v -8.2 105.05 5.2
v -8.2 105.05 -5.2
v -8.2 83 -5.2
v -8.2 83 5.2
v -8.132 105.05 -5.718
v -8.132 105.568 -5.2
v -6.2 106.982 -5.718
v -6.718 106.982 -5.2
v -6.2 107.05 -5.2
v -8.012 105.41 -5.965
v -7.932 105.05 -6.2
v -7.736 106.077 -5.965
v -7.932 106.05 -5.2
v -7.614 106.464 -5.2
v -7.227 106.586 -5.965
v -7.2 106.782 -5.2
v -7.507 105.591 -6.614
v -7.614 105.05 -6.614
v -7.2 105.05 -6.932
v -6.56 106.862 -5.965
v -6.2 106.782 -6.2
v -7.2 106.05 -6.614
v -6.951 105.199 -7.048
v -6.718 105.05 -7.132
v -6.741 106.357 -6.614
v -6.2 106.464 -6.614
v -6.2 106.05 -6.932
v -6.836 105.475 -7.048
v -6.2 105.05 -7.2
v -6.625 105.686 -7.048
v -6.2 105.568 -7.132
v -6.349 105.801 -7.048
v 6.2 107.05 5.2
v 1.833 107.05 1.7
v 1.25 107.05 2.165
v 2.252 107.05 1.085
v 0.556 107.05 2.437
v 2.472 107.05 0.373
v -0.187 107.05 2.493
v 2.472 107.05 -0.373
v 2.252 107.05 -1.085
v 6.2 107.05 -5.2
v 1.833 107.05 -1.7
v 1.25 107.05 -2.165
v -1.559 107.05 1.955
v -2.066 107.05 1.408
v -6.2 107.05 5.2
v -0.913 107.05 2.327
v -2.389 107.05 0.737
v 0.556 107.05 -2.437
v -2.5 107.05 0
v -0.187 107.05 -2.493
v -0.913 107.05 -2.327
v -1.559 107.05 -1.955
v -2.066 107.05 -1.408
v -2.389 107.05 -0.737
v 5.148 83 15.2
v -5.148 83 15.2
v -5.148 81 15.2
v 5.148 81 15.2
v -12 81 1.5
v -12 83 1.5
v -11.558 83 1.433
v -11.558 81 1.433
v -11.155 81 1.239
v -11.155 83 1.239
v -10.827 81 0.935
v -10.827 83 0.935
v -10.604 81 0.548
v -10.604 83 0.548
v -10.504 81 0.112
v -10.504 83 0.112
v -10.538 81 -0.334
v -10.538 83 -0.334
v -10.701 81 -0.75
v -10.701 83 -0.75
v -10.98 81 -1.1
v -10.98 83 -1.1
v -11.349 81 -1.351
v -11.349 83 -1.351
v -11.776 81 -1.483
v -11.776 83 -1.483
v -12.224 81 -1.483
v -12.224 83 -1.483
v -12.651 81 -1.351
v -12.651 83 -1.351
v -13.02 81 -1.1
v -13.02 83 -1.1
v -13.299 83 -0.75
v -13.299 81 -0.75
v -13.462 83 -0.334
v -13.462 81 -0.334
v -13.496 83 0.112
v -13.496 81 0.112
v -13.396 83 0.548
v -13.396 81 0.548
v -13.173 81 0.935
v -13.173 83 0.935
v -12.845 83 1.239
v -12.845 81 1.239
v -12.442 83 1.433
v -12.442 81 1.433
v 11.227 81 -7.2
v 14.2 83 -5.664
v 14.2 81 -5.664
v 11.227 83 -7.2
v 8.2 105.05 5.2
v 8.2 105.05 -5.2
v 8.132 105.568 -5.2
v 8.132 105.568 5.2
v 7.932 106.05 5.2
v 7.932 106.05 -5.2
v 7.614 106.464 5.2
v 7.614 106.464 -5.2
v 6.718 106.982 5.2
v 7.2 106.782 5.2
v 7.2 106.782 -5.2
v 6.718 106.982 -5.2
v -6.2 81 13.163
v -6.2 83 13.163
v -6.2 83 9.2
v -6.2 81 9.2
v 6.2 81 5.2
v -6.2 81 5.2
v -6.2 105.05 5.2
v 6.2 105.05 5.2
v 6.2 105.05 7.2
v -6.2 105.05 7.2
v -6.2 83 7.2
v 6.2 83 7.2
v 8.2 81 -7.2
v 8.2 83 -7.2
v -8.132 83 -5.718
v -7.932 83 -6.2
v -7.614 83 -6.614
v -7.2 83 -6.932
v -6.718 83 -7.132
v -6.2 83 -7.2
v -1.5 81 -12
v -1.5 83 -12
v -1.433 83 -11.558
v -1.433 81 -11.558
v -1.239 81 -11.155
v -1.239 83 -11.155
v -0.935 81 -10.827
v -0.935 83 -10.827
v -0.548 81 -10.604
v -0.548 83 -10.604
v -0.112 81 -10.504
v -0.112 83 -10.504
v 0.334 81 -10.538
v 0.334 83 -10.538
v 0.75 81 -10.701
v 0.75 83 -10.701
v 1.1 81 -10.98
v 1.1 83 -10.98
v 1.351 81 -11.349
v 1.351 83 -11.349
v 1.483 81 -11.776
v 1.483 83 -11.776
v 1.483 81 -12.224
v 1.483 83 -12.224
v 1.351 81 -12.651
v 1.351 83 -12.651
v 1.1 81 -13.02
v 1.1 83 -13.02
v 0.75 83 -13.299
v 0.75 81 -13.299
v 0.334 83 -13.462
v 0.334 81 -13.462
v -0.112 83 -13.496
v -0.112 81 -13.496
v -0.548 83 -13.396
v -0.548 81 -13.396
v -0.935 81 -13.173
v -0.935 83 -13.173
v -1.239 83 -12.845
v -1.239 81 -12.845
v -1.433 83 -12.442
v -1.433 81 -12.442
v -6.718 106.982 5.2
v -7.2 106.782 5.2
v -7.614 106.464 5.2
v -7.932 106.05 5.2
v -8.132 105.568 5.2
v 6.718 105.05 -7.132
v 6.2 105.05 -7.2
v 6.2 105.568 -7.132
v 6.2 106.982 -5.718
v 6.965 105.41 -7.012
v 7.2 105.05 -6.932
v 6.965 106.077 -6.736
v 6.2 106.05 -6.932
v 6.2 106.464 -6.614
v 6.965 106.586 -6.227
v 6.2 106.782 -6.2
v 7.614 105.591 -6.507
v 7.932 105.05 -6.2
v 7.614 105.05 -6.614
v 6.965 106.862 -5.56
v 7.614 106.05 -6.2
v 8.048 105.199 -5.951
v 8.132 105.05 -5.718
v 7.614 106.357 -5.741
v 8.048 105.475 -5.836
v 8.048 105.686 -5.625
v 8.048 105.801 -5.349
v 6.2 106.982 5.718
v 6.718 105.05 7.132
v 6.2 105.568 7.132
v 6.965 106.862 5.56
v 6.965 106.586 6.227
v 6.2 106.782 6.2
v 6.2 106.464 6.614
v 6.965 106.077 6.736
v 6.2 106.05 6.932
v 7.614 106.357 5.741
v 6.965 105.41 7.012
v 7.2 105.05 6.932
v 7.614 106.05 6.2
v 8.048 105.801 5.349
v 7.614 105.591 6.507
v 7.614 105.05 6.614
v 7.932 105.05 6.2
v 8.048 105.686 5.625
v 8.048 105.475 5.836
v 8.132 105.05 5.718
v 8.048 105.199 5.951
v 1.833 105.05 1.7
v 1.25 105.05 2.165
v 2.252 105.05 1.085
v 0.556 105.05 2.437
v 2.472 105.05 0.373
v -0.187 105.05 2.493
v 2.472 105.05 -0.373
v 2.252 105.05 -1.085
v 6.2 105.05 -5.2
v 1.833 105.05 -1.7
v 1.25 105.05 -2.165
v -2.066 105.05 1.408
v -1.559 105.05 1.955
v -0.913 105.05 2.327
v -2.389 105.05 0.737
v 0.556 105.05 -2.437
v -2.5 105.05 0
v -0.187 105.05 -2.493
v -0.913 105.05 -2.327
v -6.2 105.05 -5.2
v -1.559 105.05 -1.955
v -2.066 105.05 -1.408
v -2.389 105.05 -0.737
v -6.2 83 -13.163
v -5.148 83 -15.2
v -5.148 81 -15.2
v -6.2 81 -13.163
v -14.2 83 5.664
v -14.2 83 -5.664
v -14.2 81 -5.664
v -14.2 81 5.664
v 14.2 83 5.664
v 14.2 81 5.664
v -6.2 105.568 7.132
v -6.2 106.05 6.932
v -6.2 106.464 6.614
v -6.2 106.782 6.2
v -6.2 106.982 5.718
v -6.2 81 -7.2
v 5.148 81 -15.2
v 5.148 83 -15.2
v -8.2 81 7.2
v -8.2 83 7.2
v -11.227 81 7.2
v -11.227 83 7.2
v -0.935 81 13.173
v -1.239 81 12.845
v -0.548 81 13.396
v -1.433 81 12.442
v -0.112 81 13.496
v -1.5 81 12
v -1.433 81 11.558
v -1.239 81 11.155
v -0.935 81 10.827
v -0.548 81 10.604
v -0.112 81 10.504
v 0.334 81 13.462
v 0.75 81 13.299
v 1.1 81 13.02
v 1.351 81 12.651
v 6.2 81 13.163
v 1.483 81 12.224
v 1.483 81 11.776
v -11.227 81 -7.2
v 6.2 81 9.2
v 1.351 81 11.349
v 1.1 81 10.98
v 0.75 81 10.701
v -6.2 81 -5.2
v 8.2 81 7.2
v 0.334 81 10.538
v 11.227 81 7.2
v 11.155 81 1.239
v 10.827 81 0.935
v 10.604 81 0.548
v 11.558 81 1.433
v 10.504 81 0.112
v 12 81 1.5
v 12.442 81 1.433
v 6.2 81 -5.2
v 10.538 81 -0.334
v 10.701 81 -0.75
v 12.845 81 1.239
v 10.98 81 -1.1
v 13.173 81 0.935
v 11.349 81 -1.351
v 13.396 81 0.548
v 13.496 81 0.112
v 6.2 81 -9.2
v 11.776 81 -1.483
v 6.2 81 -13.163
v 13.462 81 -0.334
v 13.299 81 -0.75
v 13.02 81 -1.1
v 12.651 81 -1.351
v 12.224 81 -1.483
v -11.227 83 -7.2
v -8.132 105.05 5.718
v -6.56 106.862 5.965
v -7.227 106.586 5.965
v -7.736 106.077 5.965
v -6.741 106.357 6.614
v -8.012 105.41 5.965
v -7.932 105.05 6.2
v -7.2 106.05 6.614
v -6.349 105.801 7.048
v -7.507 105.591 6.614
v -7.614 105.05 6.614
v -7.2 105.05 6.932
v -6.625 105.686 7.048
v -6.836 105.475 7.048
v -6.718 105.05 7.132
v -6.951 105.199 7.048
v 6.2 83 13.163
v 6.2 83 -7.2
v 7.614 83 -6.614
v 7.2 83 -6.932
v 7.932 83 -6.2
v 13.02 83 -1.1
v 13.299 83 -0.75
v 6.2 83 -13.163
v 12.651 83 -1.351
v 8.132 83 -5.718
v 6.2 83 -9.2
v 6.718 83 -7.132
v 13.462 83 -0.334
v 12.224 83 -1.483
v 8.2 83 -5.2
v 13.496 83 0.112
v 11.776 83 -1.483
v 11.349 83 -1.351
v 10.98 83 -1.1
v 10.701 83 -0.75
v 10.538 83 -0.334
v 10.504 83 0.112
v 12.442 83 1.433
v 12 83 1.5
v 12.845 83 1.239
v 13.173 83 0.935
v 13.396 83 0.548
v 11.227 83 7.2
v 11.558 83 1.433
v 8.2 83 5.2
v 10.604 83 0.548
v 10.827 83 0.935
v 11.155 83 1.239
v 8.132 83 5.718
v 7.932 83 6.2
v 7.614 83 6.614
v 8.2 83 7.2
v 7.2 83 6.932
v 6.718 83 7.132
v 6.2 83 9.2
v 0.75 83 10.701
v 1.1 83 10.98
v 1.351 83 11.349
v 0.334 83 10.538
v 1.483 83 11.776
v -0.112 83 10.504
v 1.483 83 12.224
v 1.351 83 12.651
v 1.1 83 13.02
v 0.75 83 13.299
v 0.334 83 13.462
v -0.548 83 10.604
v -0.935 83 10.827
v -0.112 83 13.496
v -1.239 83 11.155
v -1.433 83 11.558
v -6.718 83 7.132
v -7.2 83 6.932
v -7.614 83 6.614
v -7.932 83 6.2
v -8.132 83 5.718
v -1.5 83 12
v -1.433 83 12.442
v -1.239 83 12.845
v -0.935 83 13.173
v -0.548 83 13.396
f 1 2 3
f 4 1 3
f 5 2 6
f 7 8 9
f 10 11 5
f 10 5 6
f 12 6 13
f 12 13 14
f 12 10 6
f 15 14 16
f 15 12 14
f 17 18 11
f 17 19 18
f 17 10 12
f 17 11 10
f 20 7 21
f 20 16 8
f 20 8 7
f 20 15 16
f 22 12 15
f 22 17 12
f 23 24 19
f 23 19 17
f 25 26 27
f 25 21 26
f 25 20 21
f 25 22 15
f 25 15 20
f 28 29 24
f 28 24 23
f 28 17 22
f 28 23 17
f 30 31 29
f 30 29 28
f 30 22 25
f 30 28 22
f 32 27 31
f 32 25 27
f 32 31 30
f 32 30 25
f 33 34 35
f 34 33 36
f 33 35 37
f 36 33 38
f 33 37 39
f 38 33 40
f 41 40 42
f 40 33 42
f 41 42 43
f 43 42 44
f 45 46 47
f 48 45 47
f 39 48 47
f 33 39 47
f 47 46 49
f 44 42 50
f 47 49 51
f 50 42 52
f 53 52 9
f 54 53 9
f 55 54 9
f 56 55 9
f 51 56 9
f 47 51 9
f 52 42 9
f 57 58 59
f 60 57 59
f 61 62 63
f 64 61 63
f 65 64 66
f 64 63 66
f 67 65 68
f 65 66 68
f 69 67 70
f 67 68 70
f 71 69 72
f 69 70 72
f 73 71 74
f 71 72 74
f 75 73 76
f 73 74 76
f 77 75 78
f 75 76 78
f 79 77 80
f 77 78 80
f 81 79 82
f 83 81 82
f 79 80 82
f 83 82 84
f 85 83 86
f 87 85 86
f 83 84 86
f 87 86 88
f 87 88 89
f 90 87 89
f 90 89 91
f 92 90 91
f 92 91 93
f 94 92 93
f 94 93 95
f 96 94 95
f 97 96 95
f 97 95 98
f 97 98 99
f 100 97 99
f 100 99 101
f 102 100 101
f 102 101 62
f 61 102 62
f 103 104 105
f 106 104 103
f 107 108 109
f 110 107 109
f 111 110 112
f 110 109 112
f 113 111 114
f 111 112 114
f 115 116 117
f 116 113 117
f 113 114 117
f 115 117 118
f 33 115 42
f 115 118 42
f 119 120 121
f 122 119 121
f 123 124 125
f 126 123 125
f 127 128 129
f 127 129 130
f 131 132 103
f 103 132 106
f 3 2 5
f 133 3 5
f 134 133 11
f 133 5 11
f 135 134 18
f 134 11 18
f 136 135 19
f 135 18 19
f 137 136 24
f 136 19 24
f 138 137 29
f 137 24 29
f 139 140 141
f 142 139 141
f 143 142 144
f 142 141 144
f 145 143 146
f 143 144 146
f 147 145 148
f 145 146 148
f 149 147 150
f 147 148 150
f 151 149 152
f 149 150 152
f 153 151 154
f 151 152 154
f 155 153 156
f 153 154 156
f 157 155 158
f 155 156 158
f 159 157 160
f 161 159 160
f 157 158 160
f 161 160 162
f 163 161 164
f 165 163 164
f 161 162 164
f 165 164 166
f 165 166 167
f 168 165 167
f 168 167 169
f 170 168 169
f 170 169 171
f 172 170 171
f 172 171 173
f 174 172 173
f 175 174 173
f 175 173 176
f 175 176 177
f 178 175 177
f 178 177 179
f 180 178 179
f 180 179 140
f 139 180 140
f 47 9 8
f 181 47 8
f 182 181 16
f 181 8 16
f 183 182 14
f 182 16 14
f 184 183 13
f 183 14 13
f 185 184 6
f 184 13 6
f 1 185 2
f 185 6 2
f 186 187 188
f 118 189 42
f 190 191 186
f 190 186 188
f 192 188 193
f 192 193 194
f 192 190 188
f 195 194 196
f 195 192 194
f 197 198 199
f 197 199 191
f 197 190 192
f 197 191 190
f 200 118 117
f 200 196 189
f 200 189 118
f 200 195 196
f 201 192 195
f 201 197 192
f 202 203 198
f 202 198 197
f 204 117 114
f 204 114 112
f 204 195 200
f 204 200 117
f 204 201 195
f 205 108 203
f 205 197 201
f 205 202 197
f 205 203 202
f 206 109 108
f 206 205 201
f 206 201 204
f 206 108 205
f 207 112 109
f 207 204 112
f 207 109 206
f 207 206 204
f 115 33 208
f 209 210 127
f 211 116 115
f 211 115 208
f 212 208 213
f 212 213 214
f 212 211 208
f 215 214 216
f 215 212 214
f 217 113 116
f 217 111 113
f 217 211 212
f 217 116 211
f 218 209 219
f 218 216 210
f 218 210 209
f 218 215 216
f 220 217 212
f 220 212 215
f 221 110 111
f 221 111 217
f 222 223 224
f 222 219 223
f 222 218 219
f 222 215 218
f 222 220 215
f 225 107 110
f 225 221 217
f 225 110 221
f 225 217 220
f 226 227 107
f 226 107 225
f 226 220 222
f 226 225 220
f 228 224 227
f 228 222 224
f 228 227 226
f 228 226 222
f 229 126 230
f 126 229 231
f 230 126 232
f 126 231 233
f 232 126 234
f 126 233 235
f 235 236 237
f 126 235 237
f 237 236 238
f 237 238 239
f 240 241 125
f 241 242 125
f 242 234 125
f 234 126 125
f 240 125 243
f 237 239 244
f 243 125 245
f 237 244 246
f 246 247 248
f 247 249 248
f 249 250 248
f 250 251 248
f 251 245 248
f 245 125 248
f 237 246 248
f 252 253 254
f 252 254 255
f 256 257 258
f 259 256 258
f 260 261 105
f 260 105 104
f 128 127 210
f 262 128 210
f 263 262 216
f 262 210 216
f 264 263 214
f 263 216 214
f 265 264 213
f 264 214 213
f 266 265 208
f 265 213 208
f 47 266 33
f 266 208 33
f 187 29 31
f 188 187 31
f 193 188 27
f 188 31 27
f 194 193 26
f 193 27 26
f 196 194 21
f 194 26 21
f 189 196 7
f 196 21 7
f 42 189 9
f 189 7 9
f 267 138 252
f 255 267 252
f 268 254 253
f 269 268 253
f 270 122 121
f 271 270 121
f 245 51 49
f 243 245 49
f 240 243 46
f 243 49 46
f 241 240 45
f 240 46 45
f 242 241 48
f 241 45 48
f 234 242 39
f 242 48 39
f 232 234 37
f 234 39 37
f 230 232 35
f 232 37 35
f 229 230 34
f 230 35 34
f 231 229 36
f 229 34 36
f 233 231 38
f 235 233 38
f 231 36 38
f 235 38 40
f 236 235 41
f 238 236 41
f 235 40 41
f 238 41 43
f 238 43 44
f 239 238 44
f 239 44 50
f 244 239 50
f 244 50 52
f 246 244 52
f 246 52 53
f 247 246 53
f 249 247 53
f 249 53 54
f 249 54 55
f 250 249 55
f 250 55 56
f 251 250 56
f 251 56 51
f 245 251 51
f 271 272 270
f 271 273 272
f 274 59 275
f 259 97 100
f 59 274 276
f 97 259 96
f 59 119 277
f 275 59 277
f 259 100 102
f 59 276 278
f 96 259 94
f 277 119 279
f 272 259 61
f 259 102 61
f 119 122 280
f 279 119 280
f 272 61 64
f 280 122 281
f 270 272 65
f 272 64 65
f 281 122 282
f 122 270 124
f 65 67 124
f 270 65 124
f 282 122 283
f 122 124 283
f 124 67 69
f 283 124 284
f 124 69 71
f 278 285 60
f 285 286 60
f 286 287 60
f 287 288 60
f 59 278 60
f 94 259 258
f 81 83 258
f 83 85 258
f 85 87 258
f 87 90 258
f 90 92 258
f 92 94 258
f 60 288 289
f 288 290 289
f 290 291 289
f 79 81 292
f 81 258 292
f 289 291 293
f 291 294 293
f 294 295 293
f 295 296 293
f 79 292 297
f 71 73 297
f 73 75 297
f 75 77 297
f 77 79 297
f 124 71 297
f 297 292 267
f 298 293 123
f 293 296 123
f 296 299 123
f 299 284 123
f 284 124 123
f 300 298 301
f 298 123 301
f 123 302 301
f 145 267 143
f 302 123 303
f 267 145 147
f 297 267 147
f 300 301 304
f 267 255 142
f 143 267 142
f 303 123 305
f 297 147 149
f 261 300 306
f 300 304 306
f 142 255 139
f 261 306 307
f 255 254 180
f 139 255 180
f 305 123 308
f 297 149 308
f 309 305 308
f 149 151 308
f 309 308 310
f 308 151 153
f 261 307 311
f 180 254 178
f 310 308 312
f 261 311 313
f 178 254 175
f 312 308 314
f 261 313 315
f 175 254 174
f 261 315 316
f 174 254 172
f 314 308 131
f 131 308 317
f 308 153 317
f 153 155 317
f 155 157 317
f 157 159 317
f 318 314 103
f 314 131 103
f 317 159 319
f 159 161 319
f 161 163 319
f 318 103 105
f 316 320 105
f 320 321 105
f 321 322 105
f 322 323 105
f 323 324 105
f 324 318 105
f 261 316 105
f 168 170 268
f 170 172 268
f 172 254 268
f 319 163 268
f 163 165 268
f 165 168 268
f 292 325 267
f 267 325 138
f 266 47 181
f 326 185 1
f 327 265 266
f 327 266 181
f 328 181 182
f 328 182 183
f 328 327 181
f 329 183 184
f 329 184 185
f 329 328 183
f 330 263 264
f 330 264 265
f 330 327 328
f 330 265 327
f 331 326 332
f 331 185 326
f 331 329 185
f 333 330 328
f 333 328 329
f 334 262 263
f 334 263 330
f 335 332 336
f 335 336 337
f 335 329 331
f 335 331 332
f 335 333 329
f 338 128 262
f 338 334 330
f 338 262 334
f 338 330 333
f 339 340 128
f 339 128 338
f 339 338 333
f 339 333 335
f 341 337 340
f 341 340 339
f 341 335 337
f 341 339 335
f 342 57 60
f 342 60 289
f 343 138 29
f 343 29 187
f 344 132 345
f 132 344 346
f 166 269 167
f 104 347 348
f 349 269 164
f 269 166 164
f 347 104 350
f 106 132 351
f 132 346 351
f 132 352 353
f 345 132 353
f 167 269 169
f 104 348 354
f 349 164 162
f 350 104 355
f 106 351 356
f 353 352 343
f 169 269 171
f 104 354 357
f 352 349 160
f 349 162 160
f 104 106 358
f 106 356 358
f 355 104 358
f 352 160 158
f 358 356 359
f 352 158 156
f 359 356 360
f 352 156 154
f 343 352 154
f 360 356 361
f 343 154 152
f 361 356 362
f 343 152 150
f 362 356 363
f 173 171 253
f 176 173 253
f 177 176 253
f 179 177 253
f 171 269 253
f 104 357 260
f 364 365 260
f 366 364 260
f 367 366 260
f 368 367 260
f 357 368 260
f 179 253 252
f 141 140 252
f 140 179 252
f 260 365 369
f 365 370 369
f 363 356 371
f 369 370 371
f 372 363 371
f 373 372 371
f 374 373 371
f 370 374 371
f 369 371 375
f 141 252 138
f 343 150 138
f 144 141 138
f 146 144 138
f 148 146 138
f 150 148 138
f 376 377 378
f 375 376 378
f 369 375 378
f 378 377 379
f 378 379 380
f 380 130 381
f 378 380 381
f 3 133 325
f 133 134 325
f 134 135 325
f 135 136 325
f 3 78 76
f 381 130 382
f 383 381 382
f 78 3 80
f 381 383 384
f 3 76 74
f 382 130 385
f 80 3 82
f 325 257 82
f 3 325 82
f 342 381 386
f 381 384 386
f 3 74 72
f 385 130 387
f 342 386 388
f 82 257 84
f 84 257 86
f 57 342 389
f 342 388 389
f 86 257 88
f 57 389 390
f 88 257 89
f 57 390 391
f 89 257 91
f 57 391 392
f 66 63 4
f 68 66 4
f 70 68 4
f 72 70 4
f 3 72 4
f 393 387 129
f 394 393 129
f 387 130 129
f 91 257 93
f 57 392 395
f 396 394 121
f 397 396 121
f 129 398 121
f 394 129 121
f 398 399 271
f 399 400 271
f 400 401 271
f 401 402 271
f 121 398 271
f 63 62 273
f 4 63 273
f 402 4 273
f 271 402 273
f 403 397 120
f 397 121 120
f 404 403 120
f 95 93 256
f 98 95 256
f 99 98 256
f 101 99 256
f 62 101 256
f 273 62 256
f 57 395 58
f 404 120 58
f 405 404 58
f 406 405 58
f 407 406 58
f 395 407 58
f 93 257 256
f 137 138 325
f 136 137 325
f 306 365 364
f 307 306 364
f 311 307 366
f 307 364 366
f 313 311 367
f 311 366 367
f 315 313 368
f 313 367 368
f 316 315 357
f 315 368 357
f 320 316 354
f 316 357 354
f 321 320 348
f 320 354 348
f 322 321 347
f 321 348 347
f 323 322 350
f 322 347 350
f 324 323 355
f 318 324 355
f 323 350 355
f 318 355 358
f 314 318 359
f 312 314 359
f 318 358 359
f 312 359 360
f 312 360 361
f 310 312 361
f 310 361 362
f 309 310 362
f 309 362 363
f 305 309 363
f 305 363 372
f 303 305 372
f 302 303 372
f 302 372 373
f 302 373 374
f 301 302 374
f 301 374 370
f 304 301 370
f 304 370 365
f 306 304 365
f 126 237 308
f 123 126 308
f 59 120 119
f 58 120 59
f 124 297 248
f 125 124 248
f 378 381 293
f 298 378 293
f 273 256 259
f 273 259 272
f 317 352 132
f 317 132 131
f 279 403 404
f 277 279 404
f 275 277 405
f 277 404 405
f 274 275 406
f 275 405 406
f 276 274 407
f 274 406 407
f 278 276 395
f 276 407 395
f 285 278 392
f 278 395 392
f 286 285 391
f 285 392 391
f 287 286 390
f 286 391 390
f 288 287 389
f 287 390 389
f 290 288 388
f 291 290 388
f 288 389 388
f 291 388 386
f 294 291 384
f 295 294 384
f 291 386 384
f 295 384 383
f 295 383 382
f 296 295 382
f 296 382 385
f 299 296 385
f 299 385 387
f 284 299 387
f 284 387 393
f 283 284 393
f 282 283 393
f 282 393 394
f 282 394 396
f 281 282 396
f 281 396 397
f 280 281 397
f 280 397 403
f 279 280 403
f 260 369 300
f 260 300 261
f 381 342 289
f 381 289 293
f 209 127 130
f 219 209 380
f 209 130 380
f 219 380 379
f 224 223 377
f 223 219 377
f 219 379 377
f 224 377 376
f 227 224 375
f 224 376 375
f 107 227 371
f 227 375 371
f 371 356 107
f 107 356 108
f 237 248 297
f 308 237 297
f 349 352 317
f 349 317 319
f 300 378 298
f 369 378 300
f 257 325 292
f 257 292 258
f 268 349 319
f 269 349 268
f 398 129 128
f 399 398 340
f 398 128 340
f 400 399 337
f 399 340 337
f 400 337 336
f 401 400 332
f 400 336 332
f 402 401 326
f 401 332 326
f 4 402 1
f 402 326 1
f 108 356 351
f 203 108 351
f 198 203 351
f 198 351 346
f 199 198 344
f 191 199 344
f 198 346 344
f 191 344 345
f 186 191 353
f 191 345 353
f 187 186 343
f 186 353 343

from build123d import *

# Parameters (mm, degrees)
BOSS_EXTRUDE1_START = 0.2
BOSS_EXTRUDE1_DEPTH = 12.4
SKETCH4_R           = 2.5
CUT_EXTRUDE1_DEPTH  = 12
SKETCH5_R           = 1.5
CUT_EXTRUDE2_DEPTH  = 12
BOSS_EXTRUDE3_DEPTH = 14.4
CIRPATTERN1_COUNT   = 2
CIRPATTERN1_ANGLE   = 90
CUT_EXTRUDE3_DEPTH  = 10
CHAMFER1_SIZE       = 2
FILLET1_R           = 2


with BuildPart() as part:
    # Sketch3 → Boss-Extrude1 (new body)
    with BuildSketch(Plane.ZY.offset(6.000000089).offset(BOSS_EXTRUDE1_START)):
        Polygon((5.2, 81), (5.2, 105.05), (-5.2, 105.05), (-5.2, 81), (-15.2, 81), (-15.2, 83), (-7.2, 83), (-7.2, 107.05), (7.2, 107.05), (7.2, 85.378651171), (7.2, 83), (15.2, 83), (15.2, 81), align=None)
    extrude(amount=-BOSS_EXTRUDE1_DEPTH)

    # Sketch4 → Cut-Extrude1 (cut)
    with BuildSketch(Plane(origin=(0, 107.05, 0), x_dir=(1, 0, 0), z_dir=(0, 1, 0))):
        with Locations(Location((0, 0, 0), (0, 0, 180))):
            Circle(SKETCH4_R)
    extrude(amount=-CUT_EXTRUDE1_DEPTH, mode=Mode.SUBTRACT)

    # Sketch5 → Cut-Extrude2 (cut)
    with BuildSketch(Plane(origin=(0, 83, 0), x_dir=(1, 0, 0), z_dir=(0, 1, 0))):
        with Locations(Location((-1.03e-07, 12, 0), (0, 0, 180))):
            Circle(SKETCH5_R)
        with Locations(Location((-1.03e-07, -12, 0), (0, 0, 180))):
            Circle(SKETCH5_R)
    cut_extrude2 = extrude(amount=-CUT_EXTRUDE2_DEPTH, mode=Mode.SUBTRACT)

    # Sketch7 → Boss-Extrude3 (add)
    with BuildSketch(Plane(origin=(0, 0, -7.2), x_dir=(-1, 0, 0), z_dir=(0, 0, -1))):
        Polygon((14.200000089, 83), (14.200000089, 81), (6.200000089, 81), (6.200000089, 107.05), (8.200000089, 107.05), (8.200000089, 83), align=None)
        Polygon((-8.200000089, 107.05), (-6.200000089, 107.05), (-6.200000089, 81), (-14.200000089, 81), (-14.200000089, 83), (-8.200000089, 83), align=None)
    extrude(amount=-BOSS_EXTRUDE3_DEPTH)

    # CirPattern1: Cut-Extrude2 ×2 about axis
    cirpattern1_axis = Axis((0, 0, 0), (0, 1, 0))
    for i in range(1, CIRPATTERN1_COUNT):
        add(cut_extrude2.rotate(cirpattern1_axis, i * CIRPATTERN1_ANGLE / (CIRPATTERN1_COUNT - 1)), mode=Mode.SUBTRACT)

    # Sketch11 → Cut-Extrude3 (cut)
    with BuildSketch(Plane(origin=(0, 83, 0), x_dir=(1, 0, 0), z_dir=(0, 1, 0))):
        with BuildLine():
            Line((18.453361638, 5.717898617), (11.935828042, 9.084933074))
            ThreePointArc((11.935828042, 9.084933074), (10.606601718, 10.606601718), (9.084933074, 11.935828042))
            Line((9.084933074, 11.935828042), (5.717898617, 18.453361638))
            Line((5.717898617, 18.453361638), (-5.717898617, 18.453361638))
            Line((-5.717898617, 18.453361638), (-9.084933074, 11.935828042))
            ThreePointArc((-9.084933074, 11.935828042), (-10.606601718, 10.606601718), (-11.935828042, 9.084933074))
            Line((-11.935828042, 9.084933074), (-18.453361638, 5.717898617))
            Line((-18.453361638, 5.717898617), (-18.453361638, -5.717898617))
            Line((-18.453361638, -5.717898617), (-11.935828042, -9.084933074))
            ThreePointArc((-11.935828042, -9.084933074), (-10.606601718, -10.606601718), (-9.084933074, -11.935828042))
            Line((-9.084933074, -11.935828042), (-5.717898617, -18.453361638))
            Line((-5.717898617, -18.453361638), (5.717898617, -18.453361638))
            Line((5.717898617, -18.453361638), (9.084933074, -11.935828042))
            ThreePointArc((9.084933074, -11.935828042), (10.606601718, -10.606601718), (11.935828042, -9.084933074))
            Line((11.935828042, -9.084933074), (18.453361638, -5.717898617))
            Line((18.453361638, -5.717898617), (18.453361638, 5.717898617))
        make_face()
        with BuildLine():
            Line((16.453361638, 4.5), (10.602285857, 7.522734517))
            ThreePointArc((10.602285857, 7.522734517), (9.192388155, 9.192388155), (7.522734517, 10.602285857))
            Line((7.522734517, 10.602285857), (4.5, 16.453361638))
            Line((4.5, 16.453361638), (-4.5, 16.453361638))
            Line((-4.5, 16.453361638), (-7.522734517, 10.602285857))
            ThreePointArc((-7.522734517, 10.602285857), (-9.192388155, 9.192388155), (-10.602285857, 7.522734517))
            Line((-10.602285857, 7.522734517), (-16.453361638, 4.5))
            Line((-16.453361638, 4.5), (-16.453361638, -4.5))
            Line((-16.453361638, -4.5), (-10.602285857, -7.522734517))
            ThreePointArc((-10.602285857, -7.522734517), (-9.192388155, -9.192388155), (-7.522734517, -10.602285857))
            Line((-7.522734517, -10.602285857), (-4.5, -16.453361638))
            Line((-4.5, -16.453361638), (4.5, -16.453361638))
            Line((4.5, -16.453361638), (7.522734517, -10.602285857))
            ThreePointArc((7.522734517, -10.602285857), (9.192388155, -9.192388155), (10.602285857, -7.522734517))
            Line((10.602285857, -7.522734517), (16.453361638, -4.5))
            Line((16.453361638, -4.5), (16.453361638, 4.5))
        make_face(mode=Mode.SUBTRACT)
    extrude(amount=-CUT_EXTRUDE3_DEPTH, mode=Mode.SUBTRACT)

    # Chamfer1
    chamfer1_edges = [part.edges().sort_by_distance(p)[0] for p in [
        (-6.200000089, 82, 7.2),
        (6.200000089, 82, -7.2),
        (6.200000089, 82, 7.2),
    ]]
    chamfer(chamfer1_edges, length=CHAMFER1_SIZE)

    # Fillet1
    # the kernel refuses this fillet: 2 mm, written as the material it takes off along each edge
    with BuildSketch(Plane(origin=(-6.200000089, 105.05, -5.2), x_dir=(0, 1, 0), z_dir=(0, 0, -1))) as fillet1_piece_1_section:
        Polygon((0, 0), (FILLET1_R * 1.02, 0), (FILLET1_R * 1.02, -FILLET1_R * 1.02), (0, -FILLET1_R * 1.02), align=None)
    fillet1_piece_1 = extrude(amount=FILLET1_R * 1.02, mode=Mode.PRIVATE)
    fillet1_piece_1 = fillet1_piece_1 - Plane(origin=(-6.200000089, 105.05, -5.2), x_dir=(0.7071067811865474, -0.7071067811865478, 5.985977498731896e-15), z_dir=(0, 0, -1)) * Sphere(FILLET1_R, mode=Mode.PRIVATE)
    add(fillet1_piece_1, mode=Mode.SUBTRACT)
    with BuildSketch(Plane(origin=(6.200000089, 105.05, -5.2), x_dir=(0, 0, -1), z_dir=(1, 0, 0))) as fillet1_piece_2_section:
        Polygon((0, 0), (FILLET1_R * 1.02, 0), (FILLET1_R * 1.02, FILLET1_R * 1.02), (0, FILLET1_R * 1.02), align=None)
    fillet1_piece_2 = extrude(amount=FILLET1_R * 1.02, mode=Mode.PRIVATE)
    fillet1_piece_2 = fillet1_piece_2 - Plane(origin=(6.200000089, 105.05, -5.2), x_dir=(-6.4472925120618815e-15, -0.7071067811865475, 0.7071067811865475), z_dir=(1, 0, 0)) * Sphere(FILLET1_R, mode=Mode.PRIVATE)
    add(fillet1_piece_2, mode=Mode.SUBTRACT)
    with BuildSketch(Plane(origin=(6.200000089, 105.05, 5.2), x_dir=(0, 0, 1), z_dir=(1, 0, 0))) as fillet1_piece_3_section:
        Polygon((0, 0), (FILLET1_R * 1.02, 0), (FILLET1_R * 1.02, -FILLET1_R * 1.02), (0, -FILLET1_R * 1.02), align=None)
    fillet1_piece_3 = extrude(amount=FILLET1_R * 1.02, mode=Mode.PRIVATE)
    fillet1_piece_3 = fillet1_piece_3 - Plane(origin=(6.200000089, 105.05, 5.2), x_dir=(5.5246624854019046e-15, -0.7071067811865475, -0.7071067811865475), z_dir=(1, 0, 0)) * Sphere(FILLET1_R, mode=Mode.PRIVATE)
    add(fillet1_piece_3, mode=Mode.SUBTRACT)
    with BuildSketch(Plane(origin=(-6.200000089, 105.05, 5.2), x_dir=(0, 1, 0), z_dir=(0, 0, 1))) as fillet1_piece_4_section:
        Polygon((0, 0), (FILLET1_R * 1.02, 0), (FILLET1_R * 1.02, FILLET1_R * 1.02), (0, FILLET1_R * 1.02), align=None)
    fillet1_piece_4 = extrude(amount=FILLET1_R * 1.02, mode=Mode.PRIVATE)
    fillet1_piece_4 = fillet1_piece_4 - Plane(origin=(-6.200000089, 105.05, 5.2), x_dir=(0.7071067811865474, -0.7071067811865478, 5.985977498731896e-15), z_dir=(0, 0, 1)) * Sphere(FILLET1_R, mode=Mode.PRIVATE)
    add(fillet1_piece_4, mode=Mode.SUBTRACT)
    with BuildSketch(Plane(origin=(-6.200000089, 107.05, -7.2), x_dir=(0, 0, 1), z_dir=(1, 0, 0)), Plane(origin=(6.200000089, 107.05, 7.2), x_dir=(0, 0, -1), z_dir=(-1, 0, 0))) as fillet1_piece_5:
        with BuildLine():
            CenterArc((FILLET1_R, FILLET1_R), FILLET1_R, 180, 90)
            Line((0, FILLET1_R), (0, 0))
            Line((0, 0), (FILLET1_R, 0))
        make_face()
    extrude(amount=12.400000179, mode=Mode.SUBTRACT)
    with BuildSketch(Plane(origin=(-8.200000089, 105.05, -7.2), x_dir=(0, 0, 1), z_dir=(0, -1, 0)), Plane(origin=(8.200000089, 83, -7.2), x_dir=(0, 0, 1), z_dir=(0, 1, 0))) as fillet1_piece_6:
        with BuildLine():
            CenterArc((FILLET1_R, -FILLET1_R), FILLET1_R, 90, 90)
            Line((0, -FILLET1_R), (0, 0))
            Line((0, 0), (FILLET1_R, 0))
        make_face()
    extrude(amount=22.05, mode=Mode.SUBTRACT)
    with BuildSketch(Plane(origin=(-8.200000089, 105.05, 7.2), x_dir=(0, 0, -1), z_dir=(0, -1, 0)), Plane(origin=(8.200000089, 83, 7.2), x_dir=(0, 0, -1), z_dir=(0, 1, 0))) as fillet1_piece_7:
        with BuildLine():
            CenterArc((FILLET1_R, FILLET1_R), FILLET1_R, 180, 90)
            Line((0, FILLET1_R), (0, 0))
            Line((0, 0), (FILLET1_R, 0))
        make_face()
    extrude(amount=22.05, mode=Mode.SUBTRACT)
    with BuildSketch(Plane(origin=(-8.200000089, 107.05, -5.2), x_dir=(1, 0, 0), z_dir=(0, 0, 1))) as fillet1_piece_8:
        with BuildLine():
            CenterArc((FILLET1_R, -FILLET1_R), FILLET1_R, 90, 90)
            Line((0, -FILLET1_R), (0, 0))
            Line((0, 0), (FILLET1_R, 0))
        make_face()
    extrude(amount=10.4, mode=Mode.SUBTRACT)
    with BuildSketch(Plane(origin=(8.200000089, 107.05, -5.2), x_dir=(-1, 0, 0), z_dir=(0, 0, 1))) as fillet1_piece_9:
        with BuildLine():
            CenterArc((FILLET1_R, FILLET1_R), FILLET1_R, 180, 90)
            Line((0, FILLET1_R), (0, 0))
            Line((0, 0), (FILLET1_R, 0))
        make_face()
    extrude(amount=10.4, mode=Mode.SUBTRACT)


solid = part.part
